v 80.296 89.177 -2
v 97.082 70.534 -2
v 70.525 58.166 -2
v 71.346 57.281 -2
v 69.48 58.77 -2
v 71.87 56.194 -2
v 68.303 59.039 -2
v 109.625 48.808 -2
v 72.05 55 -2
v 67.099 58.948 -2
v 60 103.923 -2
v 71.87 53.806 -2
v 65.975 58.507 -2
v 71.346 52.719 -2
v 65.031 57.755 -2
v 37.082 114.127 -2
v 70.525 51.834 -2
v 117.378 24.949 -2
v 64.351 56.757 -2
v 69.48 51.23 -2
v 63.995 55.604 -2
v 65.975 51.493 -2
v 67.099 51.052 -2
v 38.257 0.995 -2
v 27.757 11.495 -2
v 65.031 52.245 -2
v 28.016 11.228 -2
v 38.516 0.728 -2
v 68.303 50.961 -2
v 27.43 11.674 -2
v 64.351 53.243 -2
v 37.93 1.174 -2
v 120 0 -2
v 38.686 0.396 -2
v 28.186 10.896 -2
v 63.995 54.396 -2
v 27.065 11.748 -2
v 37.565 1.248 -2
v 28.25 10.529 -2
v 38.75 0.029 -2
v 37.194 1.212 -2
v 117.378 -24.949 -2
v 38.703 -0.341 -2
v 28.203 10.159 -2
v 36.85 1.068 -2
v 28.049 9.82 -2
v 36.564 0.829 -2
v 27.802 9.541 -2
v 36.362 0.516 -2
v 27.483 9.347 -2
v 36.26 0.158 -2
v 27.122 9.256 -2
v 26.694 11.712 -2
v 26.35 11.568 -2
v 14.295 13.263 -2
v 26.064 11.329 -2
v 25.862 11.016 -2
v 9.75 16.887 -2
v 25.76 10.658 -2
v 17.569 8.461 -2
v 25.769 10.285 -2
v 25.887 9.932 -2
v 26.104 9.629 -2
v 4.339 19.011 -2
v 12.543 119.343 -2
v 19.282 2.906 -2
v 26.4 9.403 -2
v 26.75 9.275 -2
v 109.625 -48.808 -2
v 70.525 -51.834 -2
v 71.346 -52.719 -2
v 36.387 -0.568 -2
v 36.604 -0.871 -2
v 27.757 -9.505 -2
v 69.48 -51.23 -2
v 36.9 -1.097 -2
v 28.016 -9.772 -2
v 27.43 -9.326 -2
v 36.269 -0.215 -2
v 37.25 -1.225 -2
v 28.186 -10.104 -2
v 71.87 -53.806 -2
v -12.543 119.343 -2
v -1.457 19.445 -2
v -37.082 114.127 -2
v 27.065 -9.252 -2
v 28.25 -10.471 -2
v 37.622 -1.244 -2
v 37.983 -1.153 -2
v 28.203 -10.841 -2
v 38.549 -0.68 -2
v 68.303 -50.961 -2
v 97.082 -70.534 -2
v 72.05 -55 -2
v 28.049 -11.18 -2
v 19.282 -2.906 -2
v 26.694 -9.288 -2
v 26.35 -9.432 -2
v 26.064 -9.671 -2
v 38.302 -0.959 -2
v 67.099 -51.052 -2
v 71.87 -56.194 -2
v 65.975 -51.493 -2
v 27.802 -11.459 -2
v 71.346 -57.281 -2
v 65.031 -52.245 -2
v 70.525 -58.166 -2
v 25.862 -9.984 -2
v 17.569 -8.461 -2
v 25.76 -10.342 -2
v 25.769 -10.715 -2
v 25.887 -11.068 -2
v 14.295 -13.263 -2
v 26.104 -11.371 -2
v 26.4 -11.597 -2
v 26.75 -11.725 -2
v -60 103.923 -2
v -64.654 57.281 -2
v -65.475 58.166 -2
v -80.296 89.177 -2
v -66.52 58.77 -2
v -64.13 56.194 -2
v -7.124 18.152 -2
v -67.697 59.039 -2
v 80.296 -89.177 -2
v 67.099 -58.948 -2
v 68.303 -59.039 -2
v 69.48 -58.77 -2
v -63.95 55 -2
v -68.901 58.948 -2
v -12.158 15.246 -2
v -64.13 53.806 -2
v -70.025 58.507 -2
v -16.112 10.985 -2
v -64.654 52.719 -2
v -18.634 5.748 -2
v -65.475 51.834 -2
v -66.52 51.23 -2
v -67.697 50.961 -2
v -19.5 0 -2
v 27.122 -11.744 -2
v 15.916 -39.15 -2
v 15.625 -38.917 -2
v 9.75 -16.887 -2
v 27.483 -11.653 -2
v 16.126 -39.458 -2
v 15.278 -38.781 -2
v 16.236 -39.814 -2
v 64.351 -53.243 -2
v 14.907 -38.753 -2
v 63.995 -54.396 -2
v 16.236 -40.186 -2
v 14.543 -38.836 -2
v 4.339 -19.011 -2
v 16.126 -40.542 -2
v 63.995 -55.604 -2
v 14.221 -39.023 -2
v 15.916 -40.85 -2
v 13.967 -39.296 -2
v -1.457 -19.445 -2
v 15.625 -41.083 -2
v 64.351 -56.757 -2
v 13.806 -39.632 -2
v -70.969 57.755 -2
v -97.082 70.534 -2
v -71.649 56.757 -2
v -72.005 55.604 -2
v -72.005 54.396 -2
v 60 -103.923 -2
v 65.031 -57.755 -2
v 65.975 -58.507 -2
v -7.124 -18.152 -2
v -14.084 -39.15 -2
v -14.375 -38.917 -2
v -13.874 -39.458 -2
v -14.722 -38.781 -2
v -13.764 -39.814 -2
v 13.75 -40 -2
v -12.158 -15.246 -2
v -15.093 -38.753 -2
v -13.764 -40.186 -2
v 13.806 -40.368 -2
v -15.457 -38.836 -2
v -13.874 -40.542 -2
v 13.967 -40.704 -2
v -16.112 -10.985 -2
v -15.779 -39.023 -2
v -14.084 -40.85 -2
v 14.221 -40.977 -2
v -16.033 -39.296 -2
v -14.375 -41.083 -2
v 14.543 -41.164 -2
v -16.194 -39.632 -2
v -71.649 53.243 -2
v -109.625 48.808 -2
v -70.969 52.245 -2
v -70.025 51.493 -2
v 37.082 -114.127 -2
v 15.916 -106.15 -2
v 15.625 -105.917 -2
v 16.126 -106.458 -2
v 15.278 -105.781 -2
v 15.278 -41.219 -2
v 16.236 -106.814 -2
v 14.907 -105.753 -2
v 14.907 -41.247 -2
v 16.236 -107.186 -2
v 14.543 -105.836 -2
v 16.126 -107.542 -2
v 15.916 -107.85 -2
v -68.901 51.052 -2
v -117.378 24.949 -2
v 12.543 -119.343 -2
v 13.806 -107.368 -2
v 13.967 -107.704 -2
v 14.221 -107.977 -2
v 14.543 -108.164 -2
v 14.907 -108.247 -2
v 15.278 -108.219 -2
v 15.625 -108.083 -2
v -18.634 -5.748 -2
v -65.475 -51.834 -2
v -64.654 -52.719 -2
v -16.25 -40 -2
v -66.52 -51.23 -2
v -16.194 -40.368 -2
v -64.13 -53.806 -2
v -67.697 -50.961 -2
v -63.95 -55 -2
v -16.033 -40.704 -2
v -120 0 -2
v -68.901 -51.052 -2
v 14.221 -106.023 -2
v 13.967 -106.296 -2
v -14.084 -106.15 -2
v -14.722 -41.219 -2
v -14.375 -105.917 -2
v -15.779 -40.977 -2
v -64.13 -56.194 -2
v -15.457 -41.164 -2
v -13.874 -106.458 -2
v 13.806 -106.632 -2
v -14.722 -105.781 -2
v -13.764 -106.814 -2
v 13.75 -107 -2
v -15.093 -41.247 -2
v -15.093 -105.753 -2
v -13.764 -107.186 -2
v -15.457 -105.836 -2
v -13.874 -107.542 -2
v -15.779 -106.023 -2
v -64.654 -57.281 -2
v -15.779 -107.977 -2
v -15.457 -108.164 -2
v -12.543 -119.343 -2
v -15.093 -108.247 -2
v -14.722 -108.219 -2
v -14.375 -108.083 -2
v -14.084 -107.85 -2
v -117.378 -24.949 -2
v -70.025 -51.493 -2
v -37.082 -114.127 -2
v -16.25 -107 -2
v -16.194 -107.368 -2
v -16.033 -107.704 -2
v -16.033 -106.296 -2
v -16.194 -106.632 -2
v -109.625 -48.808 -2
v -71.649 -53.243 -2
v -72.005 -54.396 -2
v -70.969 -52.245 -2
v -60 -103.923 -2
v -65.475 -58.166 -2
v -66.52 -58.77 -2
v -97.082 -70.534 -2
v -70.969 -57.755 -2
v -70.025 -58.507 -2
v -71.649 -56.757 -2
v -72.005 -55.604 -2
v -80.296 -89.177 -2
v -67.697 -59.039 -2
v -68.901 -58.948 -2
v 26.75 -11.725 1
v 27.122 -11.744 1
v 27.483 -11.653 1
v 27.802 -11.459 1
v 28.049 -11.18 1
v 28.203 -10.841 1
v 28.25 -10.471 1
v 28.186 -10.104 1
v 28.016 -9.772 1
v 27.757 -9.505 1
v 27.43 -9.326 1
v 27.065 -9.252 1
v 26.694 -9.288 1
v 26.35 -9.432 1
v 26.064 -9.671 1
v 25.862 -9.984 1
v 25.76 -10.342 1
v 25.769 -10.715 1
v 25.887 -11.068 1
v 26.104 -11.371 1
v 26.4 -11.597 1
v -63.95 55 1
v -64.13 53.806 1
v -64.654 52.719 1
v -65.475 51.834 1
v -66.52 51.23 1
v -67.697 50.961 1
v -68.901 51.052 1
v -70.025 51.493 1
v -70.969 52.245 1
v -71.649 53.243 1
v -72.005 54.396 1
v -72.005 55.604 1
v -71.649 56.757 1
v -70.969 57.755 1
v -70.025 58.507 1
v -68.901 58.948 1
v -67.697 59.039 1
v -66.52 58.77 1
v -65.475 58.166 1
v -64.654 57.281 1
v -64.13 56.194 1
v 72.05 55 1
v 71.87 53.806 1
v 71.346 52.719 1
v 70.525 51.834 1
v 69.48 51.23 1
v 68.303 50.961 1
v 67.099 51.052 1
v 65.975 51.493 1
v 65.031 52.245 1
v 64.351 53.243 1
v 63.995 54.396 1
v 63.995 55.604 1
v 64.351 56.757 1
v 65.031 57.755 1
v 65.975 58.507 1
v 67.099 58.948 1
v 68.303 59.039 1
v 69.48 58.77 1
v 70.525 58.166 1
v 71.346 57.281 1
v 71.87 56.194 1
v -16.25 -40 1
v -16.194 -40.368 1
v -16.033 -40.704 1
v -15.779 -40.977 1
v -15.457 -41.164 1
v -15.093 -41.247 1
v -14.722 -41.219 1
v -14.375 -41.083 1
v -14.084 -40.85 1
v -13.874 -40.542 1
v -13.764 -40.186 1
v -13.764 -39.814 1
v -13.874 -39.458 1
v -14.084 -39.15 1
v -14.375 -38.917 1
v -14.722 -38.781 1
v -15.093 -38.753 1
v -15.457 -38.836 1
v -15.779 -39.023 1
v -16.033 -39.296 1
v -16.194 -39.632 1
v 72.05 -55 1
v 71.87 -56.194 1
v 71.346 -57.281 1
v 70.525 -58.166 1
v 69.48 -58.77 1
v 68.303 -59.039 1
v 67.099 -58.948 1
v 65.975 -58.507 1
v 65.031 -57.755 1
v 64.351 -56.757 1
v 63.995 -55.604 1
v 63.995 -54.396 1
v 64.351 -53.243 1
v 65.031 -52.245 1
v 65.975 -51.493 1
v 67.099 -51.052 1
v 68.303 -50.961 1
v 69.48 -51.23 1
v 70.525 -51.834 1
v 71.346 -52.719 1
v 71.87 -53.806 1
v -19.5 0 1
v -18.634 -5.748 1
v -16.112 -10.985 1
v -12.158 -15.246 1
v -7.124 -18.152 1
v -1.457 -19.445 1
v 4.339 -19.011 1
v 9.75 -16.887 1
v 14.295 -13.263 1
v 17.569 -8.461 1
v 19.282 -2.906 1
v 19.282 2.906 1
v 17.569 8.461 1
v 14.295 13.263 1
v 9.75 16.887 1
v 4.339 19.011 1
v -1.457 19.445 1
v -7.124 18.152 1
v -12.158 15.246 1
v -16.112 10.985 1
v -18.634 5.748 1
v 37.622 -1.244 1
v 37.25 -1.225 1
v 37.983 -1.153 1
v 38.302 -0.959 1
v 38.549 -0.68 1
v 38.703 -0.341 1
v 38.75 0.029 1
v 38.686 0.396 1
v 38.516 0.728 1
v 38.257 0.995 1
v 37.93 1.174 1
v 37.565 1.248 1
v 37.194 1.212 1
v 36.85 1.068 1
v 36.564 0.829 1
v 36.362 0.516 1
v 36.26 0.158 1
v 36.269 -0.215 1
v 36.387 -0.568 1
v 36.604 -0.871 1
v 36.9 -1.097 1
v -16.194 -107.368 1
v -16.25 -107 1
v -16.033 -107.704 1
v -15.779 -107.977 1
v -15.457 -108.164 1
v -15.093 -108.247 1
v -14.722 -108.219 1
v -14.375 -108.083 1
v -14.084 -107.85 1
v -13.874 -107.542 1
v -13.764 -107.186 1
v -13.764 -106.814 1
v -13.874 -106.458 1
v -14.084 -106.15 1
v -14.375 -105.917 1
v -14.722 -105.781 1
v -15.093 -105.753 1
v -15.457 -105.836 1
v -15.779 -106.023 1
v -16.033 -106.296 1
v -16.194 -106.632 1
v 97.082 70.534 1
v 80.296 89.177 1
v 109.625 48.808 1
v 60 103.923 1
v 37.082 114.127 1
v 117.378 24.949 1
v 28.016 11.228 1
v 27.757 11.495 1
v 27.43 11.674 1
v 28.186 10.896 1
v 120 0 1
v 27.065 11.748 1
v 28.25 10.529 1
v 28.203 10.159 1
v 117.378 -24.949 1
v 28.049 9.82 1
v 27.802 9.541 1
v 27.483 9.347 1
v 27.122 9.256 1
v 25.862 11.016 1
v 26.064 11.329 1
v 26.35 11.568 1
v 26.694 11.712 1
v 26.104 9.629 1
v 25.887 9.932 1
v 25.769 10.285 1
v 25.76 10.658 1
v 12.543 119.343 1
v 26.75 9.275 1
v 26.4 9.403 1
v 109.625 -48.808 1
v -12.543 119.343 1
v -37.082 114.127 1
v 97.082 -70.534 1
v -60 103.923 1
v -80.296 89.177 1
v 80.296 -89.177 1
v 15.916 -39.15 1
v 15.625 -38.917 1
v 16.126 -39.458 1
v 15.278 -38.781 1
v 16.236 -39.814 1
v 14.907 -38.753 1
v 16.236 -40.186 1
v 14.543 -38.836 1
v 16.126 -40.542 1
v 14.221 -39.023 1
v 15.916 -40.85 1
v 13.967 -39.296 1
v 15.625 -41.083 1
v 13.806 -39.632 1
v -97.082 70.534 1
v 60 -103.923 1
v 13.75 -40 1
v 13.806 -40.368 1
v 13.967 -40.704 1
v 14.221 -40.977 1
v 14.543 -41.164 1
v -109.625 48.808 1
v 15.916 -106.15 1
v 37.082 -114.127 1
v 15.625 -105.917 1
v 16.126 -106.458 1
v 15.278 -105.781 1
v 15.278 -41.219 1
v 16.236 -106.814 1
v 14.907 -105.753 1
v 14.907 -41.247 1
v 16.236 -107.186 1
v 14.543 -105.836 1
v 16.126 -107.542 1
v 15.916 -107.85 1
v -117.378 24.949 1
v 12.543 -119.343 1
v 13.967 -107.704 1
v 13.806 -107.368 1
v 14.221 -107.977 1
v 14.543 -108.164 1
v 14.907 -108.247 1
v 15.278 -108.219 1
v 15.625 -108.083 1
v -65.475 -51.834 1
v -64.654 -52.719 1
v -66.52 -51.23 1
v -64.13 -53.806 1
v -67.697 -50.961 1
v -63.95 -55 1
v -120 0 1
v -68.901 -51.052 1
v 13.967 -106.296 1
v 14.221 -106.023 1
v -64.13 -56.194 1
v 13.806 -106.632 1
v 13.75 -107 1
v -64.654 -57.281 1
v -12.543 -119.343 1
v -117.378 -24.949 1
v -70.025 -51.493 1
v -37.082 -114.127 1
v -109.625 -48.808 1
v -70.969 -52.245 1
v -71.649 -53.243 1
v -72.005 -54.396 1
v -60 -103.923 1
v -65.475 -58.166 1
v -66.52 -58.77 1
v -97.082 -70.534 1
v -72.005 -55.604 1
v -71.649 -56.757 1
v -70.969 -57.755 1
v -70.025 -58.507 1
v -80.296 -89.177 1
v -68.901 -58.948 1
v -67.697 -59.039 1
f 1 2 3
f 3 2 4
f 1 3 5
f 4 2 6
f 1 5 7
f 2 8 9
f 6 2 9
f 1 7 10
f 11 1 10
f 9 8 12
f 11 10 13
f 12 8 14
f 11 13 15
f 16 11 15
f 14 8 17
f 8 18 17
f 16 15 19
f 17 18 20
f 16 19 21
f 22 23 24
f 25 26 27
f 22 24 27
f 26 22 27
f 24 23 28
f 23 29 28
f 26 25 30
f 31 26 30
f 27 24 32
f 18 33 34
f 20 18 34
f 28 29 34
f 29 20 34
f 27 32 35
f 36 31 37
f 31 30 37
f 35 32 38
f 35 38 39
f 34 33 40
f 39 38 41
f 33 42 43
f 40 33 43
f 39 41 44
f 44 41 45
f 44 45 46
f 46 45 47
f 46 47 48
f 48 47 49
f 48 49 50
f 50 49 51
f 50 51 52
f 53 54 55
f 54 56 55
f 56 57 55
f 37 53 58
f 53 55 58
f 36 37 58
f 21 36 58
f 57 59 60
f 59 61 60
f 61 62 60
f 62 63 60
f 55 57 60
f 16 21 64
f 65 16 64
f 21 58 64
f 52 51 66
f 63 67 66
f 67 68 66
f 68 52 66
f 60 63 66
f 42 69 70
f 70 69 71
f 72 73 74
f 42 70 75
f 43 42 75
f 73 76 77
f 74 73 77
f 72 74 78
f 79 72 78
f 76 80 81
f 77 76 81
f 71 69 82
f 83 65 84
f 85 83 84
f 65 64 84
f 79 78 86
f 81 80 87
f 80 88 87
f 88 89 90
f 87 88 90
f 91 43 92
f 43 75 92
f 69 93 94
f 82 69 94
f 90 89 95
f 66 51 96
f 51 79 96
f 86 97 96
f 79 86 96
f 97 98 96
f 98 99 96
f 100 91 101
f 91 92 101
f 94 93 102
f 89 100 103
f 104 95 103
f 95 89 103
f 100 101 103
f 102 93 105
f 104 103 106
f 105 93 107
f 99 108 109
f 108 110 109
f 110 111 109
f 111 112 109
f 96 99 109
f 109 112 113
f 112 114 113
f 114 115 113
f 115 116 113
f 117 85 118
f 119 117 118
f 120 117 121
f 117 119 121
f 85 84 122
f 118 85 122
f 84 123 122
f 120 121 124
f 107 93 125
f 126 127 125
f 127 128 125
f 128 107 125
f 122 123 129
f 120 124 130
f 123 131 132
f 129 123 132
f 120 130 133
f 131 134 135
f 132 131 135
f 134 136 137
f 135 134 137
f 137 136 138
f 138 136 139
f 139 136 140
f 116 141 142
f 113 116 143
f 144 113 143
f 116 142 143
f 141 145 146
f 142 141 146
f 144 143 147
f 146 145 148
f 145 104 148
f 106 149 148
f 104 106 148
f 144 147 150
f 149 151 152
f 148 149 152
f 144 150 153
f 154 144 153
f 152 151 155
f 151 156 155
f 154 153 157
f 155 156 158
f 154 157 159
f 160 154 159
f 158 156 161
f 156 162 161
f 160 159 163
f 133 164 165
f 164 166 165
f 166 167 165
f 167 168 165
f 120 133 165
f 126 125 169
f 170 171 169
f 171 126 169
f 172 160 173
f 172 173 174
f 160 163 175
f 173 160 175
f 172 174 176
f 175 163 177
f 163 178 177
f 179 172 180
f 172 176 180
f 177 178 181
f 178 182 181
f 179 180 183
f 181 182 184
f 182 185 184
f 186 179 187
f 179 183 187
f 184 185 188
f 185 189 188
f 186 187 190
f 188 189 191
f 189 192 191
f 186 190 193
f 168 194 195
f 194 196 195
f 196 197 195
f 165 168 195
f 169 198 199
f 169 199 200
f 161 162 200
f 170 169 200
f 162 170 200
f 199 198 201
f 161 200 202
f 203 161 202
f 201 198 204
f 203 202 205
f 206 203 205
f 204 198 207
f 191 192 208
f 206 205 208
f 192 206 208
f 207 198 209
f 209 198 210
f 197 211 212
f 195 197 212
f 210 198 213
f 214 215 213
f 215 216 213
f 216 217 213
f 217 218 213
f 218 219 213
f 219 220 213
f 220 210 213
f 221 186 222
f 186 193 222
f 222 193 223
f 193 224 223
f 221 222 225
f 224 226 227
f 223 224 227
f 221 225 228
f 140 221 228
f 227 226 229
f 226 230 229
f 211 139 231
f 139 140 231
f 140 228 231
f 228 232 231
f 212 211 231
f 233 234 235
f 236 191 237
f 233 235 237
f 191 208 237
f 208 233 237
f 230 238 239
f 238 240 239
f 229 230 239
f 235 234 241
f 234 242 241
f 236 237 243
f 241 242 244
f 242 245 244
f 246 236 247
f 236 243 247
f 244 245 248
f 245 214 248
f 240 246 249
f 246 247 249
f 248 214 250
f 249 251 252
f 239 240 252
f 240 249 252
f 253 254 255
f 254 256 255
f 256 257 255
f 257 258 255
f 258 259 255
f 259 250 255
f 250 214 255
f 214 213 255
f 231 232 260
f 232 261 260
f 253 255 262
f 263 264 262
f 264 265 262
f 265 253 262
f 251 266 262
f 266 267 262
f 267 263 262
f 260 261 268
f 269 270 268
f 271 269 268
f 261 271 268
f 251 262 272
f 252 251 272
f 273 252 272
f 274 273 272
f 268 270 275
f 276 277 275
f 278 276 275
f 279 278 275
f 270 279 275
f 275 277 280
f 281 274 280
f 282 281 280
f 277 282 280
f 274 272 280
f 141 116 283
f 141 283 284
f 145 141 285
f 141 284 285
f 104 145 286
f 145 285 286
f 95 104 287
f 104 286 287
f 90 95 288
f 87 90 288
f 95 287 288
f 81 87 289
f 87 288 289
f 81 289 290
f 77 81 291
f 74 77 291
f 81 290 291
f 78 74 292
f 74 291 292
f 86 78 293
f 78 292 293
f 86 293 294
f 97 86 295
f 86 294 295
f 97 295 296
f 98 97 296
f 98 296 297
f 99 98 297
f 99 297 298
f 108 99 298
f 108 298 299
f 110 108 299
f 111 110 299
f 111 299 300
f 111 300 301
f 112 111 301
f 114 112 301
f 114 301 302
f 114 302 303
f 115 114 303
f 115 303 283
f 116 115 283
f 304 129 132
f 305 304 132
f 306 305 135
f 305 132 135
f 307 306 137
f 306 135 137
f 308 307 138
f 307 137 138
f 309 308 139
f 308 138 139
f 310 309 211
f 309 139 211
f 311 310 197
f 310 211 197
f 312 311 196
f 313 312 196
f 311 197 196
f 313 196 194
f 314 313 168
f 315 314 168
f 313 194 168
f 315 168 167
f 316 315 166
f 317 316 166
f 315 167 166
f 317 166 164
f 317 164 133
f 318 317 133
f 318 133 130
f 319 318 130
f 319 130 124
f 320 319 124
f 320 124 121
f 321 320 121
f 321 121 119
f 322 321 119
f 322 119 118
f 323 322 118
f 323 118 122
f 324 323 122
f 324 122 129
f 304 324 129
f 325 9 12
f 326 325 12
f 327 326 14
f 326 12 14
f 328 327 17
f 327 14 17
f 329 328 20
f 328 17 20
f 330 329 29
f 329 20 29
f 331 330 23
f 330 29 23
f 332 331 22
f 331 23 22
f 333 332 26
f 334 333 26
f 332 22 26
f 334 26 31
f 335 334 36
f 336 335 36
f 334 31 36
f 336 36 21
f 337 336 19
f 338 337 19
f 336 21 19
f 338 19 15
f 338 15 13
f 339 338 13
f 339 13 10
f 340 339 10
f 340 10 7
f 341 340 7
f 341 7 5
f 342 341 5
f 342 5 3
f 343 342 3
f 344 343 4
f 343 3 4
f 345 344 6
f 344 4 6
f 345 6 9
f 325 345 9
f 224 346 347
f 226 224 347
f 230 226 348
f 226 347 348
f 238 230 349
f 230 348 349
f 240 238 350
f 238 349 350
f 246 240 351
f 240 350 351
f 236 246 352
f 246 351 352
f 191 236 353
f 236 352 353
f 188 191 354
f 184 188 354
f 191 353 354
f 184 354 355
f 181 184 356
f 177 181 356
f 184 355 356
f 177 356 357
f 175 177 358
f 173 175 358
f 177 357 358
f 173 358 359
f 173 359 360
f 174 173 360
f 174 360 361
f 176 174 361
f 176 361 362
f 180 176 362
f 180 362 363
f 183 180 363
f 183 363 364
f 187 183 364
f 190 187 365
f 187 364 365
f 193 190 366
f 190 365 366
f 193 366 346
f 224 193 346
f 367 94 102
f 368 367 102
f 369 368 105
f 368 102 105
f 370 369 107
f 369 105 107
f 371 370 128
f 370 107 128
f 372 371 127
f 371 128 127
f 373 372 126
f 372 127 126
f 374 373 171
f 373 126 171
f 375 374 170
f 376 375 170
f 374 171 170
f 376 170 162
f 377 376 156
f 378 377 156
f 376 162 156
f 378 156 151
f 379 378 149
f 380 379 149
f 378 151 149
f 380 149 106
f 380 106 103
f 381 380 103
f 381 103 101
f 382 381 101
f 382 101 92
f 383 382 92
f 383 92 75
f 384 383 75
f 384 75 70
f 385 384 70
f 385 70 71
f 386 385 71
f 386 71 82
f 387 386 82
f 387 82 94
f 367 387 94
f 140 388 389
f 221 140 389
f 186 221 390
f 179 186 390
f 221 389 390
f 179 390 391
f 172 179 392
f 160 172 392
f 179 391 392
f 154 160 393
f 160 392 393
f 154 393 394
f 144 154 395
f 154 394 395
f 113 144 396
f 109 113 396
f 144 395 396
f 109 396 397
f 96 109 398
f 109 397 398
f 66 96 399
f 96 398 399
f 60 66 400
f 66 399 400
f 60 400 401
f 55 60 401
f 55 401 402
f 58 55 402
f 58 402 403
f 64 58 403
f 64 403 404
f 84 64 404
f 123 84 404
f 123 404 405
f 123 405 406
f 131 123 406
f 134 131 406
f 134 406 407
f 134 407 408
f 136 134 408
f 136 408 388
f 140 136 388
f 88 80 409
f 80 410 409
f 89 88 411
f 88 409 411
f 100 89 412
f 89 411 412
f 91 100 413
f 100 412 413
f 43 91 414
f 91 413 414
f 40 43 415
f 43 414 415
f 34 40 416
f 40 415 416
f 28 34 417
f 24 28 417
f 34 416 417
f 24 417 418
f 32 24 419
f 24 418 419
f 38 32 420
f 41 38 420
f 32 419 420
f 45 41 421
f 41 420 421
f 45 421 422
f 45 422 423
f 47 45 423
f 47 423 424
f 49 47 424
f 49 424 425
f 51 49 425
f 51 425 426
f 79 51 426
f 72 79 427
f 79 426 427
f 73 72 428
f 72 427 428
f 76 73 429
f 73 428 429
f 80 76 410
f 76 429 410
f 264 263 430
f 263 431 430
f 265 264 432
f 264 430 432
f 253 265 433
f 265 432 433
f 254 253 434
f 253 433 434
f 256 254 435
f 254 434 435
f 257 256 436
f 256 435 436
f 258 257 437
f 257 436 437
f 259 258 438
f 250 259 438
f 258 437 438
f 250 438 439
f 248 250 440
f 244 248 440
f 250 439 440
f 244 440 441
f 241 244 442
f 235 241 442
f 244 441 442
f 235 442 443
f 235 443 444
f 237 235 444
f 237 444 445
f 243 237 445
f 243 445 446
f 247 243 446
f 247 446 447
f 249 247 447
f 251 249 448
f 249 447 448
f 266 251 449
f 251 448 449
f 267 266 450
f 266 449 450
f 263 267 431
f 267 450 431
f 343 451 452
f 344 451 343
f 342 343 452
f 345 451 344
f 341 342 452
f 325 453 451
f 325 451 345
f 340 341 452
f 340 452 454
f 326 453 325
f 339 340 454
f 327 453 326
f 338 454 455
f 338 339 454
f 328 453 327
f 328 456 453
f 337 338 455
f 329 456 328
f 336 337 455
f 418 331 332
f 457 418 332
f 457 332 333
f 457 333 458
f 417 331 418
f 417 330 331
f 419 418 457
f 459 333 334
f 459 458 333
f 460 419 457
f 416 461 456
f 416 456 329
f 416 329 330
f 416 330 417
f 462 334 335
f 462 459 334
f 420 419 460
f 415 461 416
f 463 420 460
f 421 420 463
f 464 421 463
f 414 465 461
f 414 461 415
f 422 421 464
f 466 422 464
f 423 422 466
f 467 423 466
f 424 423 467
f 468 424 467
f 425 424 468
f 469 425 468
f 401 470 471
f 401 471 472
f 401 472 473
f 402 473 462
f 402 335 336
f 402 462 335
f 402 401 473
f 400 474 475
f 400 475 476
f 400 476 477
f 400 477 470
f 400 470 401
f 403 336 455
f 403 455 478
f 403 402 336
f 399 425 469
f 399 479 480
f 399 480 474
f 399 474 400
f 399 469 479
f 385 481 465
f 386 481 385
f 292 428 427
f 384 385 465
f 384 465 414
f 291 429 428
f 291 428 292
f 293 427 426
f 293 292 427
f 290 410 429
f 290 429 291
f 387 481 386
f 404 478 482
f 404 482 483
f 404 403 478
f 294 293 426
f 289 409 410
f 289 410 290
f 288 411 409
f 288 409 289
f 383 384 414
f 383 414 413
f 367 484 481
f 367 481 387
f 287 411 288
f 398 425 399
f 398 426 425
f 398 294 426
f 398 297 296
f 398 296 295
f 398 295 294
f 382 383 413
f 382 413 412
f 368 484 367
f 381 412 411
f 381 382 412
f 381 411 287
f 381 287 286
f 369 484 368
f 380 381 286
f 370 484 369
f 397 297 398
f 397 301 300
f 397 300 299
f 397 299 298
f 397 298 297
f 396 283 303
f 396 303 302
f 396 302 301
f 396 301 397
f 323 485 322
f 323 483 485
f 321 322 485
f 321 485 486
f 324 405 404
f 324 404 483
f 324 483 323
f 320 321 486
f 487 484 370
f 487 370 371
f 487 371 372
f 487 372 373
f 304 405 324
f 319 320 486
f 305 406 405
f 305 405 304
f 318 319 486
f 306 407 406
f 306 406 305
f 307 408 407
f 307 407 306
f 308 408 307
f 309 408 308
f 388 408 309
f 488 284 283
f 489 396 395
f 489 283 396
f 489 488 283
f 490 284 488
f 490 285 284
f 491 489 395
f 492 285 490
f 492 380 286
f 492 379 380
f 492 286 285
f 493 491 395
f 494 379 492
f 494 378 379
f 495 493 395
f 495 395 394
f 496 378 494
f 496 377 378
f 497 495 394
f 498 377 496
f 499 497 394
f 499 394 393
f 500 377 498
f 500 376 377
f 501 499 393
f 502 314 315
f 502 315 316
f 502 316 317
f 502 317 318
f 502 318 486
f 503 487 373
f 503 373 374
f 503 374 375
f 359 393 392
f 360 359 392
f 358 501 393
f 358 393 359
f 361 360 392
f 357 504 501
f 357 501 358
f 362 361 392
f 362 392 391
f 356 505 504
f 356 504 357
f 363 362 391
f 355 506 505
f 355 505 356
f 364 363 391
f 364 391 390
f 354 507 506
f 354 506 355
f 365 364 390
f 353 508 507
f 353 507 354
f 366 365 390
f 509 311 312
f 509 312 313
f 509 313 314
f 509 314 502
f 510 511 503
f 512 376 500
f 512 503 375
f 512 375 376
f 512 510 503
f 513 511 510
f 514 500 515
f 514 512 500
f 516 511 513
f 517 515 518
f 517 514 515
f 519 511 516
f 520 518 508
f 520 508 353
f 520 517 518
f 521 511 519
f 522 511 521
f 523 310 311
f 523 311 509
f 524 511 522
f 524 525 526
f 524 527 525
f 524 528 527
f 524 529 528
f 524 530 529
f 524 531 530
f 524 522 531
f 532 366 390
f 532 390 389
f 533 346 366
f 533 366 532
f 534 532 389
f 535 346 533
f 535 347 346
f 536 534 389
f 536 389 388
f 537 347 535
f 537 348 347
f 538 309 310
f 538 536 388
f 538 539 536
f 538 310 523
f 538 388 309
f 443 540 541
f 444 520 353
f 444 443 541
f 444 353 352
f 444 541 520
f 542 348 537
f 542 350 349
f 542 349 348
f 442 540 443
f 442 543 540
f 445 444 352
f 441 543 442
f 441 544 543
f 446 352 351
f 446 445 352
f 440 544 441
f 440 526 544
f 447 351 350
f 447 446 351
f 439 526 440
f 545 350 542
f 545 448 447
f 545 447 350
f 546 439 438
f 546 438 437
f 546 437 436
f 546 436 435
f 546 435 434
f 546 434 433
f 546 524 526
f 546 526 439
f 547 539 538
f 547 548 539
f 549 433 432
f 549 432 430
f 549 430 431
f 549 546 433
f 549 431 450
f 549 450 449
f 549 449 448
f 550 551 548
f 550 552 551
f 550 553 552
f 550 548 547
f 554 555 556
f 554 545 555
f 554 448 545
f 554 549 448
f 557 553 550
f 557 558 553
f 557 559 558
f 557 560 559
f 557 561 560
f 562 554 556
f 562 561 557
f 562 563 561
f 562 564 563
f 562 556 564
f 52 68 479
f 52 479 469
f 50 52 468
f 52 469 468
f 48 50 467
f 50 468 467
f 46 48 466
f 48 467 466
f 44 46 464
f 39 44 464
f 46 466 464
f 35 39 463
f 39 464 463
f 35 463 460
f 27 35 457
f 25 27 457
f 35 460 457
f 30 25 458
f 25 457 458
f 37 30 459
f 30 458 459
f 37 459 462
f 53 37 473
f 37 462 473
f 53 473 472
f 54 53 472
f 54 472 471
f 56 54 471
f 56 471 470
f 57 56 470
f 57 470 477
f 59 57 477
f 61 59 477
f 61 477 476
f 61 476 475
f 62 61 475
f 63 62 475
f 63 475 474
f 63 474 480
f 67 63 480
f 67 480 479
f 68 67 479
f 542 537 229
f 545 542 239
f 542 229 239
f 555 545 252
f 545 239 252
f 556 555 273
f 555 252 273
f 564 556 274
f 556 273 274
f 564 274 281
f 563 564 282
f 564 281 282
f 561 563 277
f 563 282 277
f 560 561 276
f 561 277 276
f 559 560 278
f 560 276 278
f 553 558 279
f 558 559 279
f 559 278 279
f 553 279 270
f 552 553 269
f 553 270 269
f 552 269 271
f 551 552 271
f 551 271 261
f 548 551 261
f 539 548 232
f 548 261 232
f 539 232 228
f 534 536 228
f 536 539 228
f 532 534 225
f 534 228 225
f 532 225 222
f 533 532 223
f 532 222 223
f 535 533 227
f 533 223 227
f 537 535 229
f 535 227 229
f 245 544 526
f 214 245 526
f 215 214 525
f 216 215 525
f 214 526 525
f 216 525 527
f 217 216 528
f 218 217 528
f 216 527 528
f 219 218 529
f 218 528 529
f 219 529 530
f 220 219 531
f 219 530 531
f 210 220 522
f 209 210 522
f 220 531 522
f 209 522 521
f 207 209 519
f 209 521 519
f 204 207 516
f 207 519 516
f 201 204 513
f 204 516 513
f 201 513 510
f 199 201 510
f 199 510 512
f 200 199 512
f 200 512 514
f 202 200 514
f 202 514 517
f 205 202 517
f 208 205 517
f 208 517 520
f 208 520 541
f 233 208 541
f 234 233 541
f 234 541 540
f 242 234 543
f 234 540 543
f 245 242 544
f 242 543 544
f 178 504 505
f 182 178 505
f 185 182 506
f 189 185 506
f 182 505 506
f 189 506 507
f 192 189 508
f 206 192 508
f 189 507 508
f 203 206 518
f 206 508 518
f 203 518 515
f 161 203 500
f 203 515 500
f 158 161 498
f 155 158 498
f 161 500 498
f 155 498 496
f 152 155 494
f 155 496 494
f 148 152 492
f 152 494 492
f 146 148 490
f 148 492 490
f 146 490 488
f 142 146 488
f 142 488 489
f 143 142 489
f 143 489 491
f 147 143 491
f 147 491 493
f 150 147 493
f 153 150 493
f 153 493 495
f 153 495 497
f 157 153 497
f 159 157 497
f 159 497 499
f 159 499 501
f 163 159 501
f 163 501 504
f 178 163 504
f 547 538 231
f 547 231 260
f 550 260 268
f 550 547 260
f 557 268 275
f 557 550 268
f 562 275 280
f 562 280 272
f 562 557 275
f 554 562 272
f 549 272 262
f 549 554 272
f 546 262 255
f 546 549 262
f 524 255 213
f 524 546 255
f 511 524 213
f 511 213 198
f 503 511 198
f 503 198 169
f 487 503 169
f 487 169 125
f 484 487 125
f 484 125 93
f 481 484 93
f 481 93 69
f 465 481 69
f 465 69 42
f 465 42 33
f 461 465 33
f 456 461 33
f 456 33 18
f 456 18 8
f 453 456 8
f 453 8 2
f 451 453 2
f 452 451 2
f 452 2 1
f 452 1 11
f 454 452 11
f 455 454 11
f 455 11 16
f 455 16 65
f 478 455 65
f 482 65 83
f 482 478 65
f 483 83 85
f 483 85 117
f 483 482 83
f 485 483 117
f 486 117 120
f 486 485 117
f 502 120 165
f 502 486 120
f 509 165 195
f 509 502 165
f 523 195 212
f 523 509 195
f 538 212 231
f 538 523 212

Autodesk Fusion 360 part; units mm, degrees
sketch "スケッチ1" plane through (0, 0, 0) normal (0, 0, 1) x (1, 0, 0)
  line L0 (68, -55) -> (-68, -55)
  line L1 (-68, -55) -> (-68, 55)
  line L2 (-68, 55) -> (68, 55)
  line L3 (68, 55) -> (68, -55)
  line L4 (68, -55) -> (-68, 55) construction
  line L5 (-68, -55) -> (68, 55) construction
  circle A0 centre (-68, 55) radius 4.05
  circle A1 centre (68, 55) radius 4.05
  circle A2 centre (-68, -55) radius 4.05
  circle A3 centre (68, -55) radius 4.05
  circle A4 centre (0, 0) radius 35
  circle A5 centre (0, 0) radius 130
  dimension "d1" = 136
  dimension "d2" = 110
  dimension "d3" = 8.1
  dimension "d4" = 8.1
  dimension "d5" = 8.1
  dimension "d6" = 8.1
  dimension "d18" = 70
  dimension "d19" = 260
extrude "押し出し1" add sketch "スケッチ1" along normal blind 1 contours L0 L1 L2 L3 A0 A1 A2 A3 | A5
sketch "スケッチ7" plane through (0, 0, 1) normal (0, 0, 1) x (-1, 0, 0)
  circle A0 centre (68, -55) radius 4.05
  circle A1 centre (68, 55) radius 4.05
  circle A2 centre (-68, -55) radius 4.05
  circle A3 centre (-68, 55) radius 4.05
  circle A4 centre (0, 0) radius 35
  circle A5 centre (0, 0) radius 130
  circle A6 centre (0, 0) radius 25
  dimension "d809" = 50
extrude "押し出し11" add sketch "スケッチ7" against normal blind 1 contours A4
sketch "スケッチ8" plane through (0, 0, 1) normal (0, 0, 1) x (-1, 0, 0)
  circle A0 centre (0, 0) radius 25
  circle A1 centre (68, -55) radius 4.05
  circle A2 centre (68, 55) radius 4.05
  circle A3 centre (-68, -55) radius 4.05
  circle A4 centre (-68, 55) radius 4.05
  circle A5 centre (0, 0) radius 130
  line L0 (0, 0) -> (16.5, 0)
  line L1 (16.5, 0) -> (16.5, 25.6)
  circle A6 centre (16.5, 25.6) radius 1.25
  line L2 (0, 0) -> (-16.5, 0)
  line L3 (-16.5, 0) -> (-16.5, -25.6)
  circle A7 centre (-16.5, -25.6) radius 1.25
  line L4 (-16.5, -25.6) -> (-37.5, -25.6)
  circle A8 centre (-37.5, -25.6) radius 1.25
  line L5 (-27, -25.6) -> (-27, -36.1)
  line L6 (-27, -25.6) -> (-27, -15.1)
  circle A9 centre (-27, -36.1) radius 1.25
  circle A10 centre (-27, -15.1) radius 1.25
  dimension "d812" = 16.5
  dimension "d813" = 25.6
  dimension "d814" = 2.5
  dimension "d817" = 16.5
  dimension "d818" = 25.6
  dimension "d819" = 2.5
  dimension "d822" = 21
  dimension "d823" = 2.5
  dimension "d824" = 10.5
  dimension "d825" = 10.5
  dimension "d826" = 2.5
  dimension "d827" = 2.5
extrude "押し出し13" cut sketch "スケッチ8" against normal blind 1 contours L3 A7 L4 | L3 A7 L4 | A8 | A9 | A10
sketch "スケッチ9" plane through (0, 0, 1) normal (0, 0, 1) x (-1, 0, 0)
  circle A0 centre (-27, -36.1) radius 1.25
  circle A1 centre (-37.5, -25.6) radius 1.25
  circle A2 centre (-16.5, -25.6) radius 1.25
  circle A3 centre (-27, -15.1) radius 1.25
  circle A4 centre (0, 0) radius 25
  circle A5 centre (68, -55) radius 4.05
  circle A6 centre (68, 55) radius 4.05
  circle A7 centre (-68, -55) radius 4.05
  circle A8 centre (-68, 55) radius 4.05
  circle A9 centre (0, 0) radius 130
  circle A10 centre (0, 0) radius 120
  dimension "d828" = -10
extrude "押し出し14" cut sketch "スケッチ9" against normal blind 1 contours A9
sketch "スケッチ10" plane through (0, 0, 1) normal (0, 0, 1) x (-1, 0, 0)
  circle A0 centre (0, 0) radius 120
  circle A1 centre (-27, -36.1) radius 1.25
  circle A2 centre (-37.5, -25.6) radius 1.25
  circle A3 centre (-16.5, -25.6) radius 1.25
  circle A4 centre (-27, -15.1) radius 1.25
  circle A5 centre (0, 0) radius 25
  circle A6 centre (68, -55) radius 4.05
  circle A7 centre (68, 55) radius 4.05
  circle A8 centre (-68, -55) radius 4.05
  circle A9 centre (-68, 55) radius 4.05
  line L0 (0, 0) -> (0, 40)
  line L1 (0, 40) -> (-15, 40)
  line L2 (0, 40) -> (15, 40)
  circle A10 centre (15, 40) radius 1.25
  circle A11 centre (-15, 40) radius 1.25
  dimension "d838" = 40
  dimension "d839" = 15
  dimension "d840" = 15
  dimension "d841" = 2.5
  dimension "d842" = 2.5
extrude "押し出し16" cut sketch "スケッチ10" against normal blind 1 contours A10 | A11
sketch "スケッチ11" plane through (0, 0, 1) normal (0, 0, 1) x (-1, 0, 0)
  circle A0 centre (-15, 40) radius 1.25
  circle A1 centre (15, 40) radius 1.25
  circle A2 centre (0, 0) radius 120
  circle A3 centre (-27, -36.1) radius 1.25
  circle A4 centre (-37.5, -25.6) radius 1.25
  circle A5 centre (-16.5, -25.6) radius 1.25
  circle A6 centre (-27, -15.1) radius 1.25
  circle A7 centre (0, 0) radius 25
  circle A8 centre (68, -55) radius 4.05
  circle A9 centre (68, 55) radius 4.05
  circle A10 centre (-68, -55) radius 4.05
  circle A11 centre (-68, 55) radius 4.05
  line L0 (0, 0) -> (0, 107)
  line L1 (0, 107) -> (15, 107)
  line L2 (0, 107) -> (-15, 107)
  circle A12 centre (15, 107) radius 1.25
  circle A13 centre (-15, 107) radius 1.25
  dimension "d845" = 107
  dimension "d846" = 15
  dimension "d847" = 15
  dimension "d848" = 2.5
  dimension "d849" = 2.5
extrude "押し出し17" cut sketch "スケッチ11" against normal blind 1 contours A12 | A13
sketch "スケッチ12" plane through (0, 0, 1) normal (0, 0, 1) x (-1, 0, 0)
  circle A0 centre (15, 107) radius 1.25
  circle A1 centre (-15, 107) radius 1.25
  circle A2 centre (-15, 40) radius 1.25
  circle A3 centre (15, 40) radius 1.25
  circle A4 centre (0, 0) radius 120
  circle A5 centre (-27, -36.1) radius 1.25
  circle A6 centre (-37.5, -25.6) radius 1.25
  circle A7 centre (-16.5, -25.6) radius 1.25
  circle A8 centre (-27, -15.1) radius 1.25
  circle A9 centre (0, 0) radius 25
  circle A10 centre (68, -55) radius 4.05
  circle A11 centre (68, 55) radius 4.05
  circle A12 centre (-68, -55) radius 4.05
  circle A13 centre (-68, 55) radius 4.05
  line L0 (-37.5, -25.6) -> (-37.5, 0)
  circle A14 centre (-37.5, 0) radius 1.25
  line L1 (-27, -15.1) -> (-27, 10.5)
  circle A15 centre (-27, 10.5) radius 1.25
  line L2 (-27, -36.1) -> (-27, -10.5)
  circle A16 centre (-27, -10.5) radius 1.25
  dimension "d852" = 25.6
  dimension "d853" = 2.5
  dimension "d854" = 25.6
  dimension "d855" = 2.5
  dimension "d856" = 25.6
  dimension "d857" = 2.5
extrude "押し出し18" add sketch "スケッチ12" against normal blind 1 contours A5 | A6 | A7 | A8 L1 L2 | A8 L1 L2
extrude "押し出し19" cut sketch "スケッチ12" against normal blind 1 contours A14 | L1 L2 A16 | L1 L2 A16 | A15
extrude "押し出し20" add 1 faces at (-71.1115, -16.9879, 0) along direction (0, 0, -1) blind 2
sketch "スケッチ13" plane through (0, 0, 1) normal (0, 0, 1) x (-1, 0, 0)
  circle A0 centre (-37.5, 0) radius 1.25
  circle A1 centre (-27, 10.5) radius 1.25
  circle A2 centre (-27, -10.5) radius 1.25
  circle A3 centre (15, 107) radius 1.25
  circle A4 centre (-15, 107) radius 1.25
  circle A5 centre (-15, 40) radius 1.25
  circle A6 centre (15, 40) radius 1.25
  circle A7 centre (0, 0) radius 120
  circle A8 centre (0, 0) radius 25
  circle A9 centre (68, -55) radius 4.05
  circle A10 centre (68, 55) radius 4.05
  circle A11 centre (-68, -55) radius 4.05
  circle A12 centre (-68, 55) radius 4.05
  circle A13 centre (0, 0) radius 20
  dimension "d864" = 40
extrude "押し出し21" add sketch "スケッチ13" against normal blind 3 contours A8
sketch "スケッチ14" plane through (0, 0, 1) normal (0, 0, 1) x (-1, 0, 0)
  circle A0 centre (0, 0) radius 20
  circle A1 centre (-37.5, 0) radius 1.25
  circle A2 centre (-27, 10.5) radius 1.25
  circle A3 centre (-27, -10.5) radius 1.25
  circle A4 centre (15, 107) radius 1.25
  circle A5 centre (-15, 107) radius 1.25
  circle A6 centre (-15, 40) radius 1.25
  circle A7 centre (15, 40) radius 1.25
  circle A8 centre (0, 0) radius 120
  circle A9 centre (68, -55) radius 4.05
  circle A10 centre (68, 55) radius 4.05
  circle A11 centre (-68, -55) radius 4.05
  circle A12 centre (-68, 55) radius 4.05
  line L0 (-37.5, 0) -> (-37, 0)
  line L1 (-27, -10.5) -> (-26.5, -10.5)
  line L2 (-27, 10.5) -> (-26.5, 10.5)
  circle A13 centre (-26.5, -10.5) radius 1.25
  circle A14 centre (-37, 0) radius 1.25
  circle A15 centre (-26.5, 10.5) radius 1.25
  dimension "d867" = 0.5
  dimension "d868" = 0.5
  dimension "d869" = 0.5
  dimension "d870" = 2.5
  dimension "d871" = 2.5
  dimension "d872" = 2.5
extrude "押し出し22" cut sketch "スケッチ14" against normal blind 3 contours A1 A14 | A2 A15 | A3 A13 picked at (-35.9431, -0.2395) picked at (-25.4431, 10.2605) picked at (-25.4431, -10.7395)
extrude "押し出し23" add sketch "スケッチ14" against normal blind 3 contours A1 A14 | A2 A15 | A3 A13 picked at (-38.5777, -0.0913) picked at (-28.0777, 10.5913) picked at (-28.0777, -10.4087)
sketch "スケッチ15" plane through (0, 0, 1) normal (0, 0, 1) x (-1, 0, 0)
  circle A0 centre (-68, 55) radius 4.05
  circle A1 centre (-68, -55) radius 4.05
  circle A2 centre (68, 55) radius 4.05
  circle A3 centre (68, -55) radius 4.05
  circle A4 centre (0, 0) radius 120
  circle A5 centre (15, 40) radius 1.25
  circle A6 centre (-15, 40) radius 1.25
  circle A7 centre (-15, 107) radius 1.25
  circle A8 centre (15, 107) radius 1.25
  circle A9 centre (-26.5, -10.5) radius 1.25
  circle A10 centre (-26.5, 10.5) radius 1.25
  circle A11 centre (-37, 0) radius 1.25
  circle A12 centre (0, 0) radius 20
  circle A13 centre (0, 0) radius 19.5
  dimension "d877" = 39
extrude "押し出し24" add sketch "スケッチ15" against normal blind 3 contours A12
